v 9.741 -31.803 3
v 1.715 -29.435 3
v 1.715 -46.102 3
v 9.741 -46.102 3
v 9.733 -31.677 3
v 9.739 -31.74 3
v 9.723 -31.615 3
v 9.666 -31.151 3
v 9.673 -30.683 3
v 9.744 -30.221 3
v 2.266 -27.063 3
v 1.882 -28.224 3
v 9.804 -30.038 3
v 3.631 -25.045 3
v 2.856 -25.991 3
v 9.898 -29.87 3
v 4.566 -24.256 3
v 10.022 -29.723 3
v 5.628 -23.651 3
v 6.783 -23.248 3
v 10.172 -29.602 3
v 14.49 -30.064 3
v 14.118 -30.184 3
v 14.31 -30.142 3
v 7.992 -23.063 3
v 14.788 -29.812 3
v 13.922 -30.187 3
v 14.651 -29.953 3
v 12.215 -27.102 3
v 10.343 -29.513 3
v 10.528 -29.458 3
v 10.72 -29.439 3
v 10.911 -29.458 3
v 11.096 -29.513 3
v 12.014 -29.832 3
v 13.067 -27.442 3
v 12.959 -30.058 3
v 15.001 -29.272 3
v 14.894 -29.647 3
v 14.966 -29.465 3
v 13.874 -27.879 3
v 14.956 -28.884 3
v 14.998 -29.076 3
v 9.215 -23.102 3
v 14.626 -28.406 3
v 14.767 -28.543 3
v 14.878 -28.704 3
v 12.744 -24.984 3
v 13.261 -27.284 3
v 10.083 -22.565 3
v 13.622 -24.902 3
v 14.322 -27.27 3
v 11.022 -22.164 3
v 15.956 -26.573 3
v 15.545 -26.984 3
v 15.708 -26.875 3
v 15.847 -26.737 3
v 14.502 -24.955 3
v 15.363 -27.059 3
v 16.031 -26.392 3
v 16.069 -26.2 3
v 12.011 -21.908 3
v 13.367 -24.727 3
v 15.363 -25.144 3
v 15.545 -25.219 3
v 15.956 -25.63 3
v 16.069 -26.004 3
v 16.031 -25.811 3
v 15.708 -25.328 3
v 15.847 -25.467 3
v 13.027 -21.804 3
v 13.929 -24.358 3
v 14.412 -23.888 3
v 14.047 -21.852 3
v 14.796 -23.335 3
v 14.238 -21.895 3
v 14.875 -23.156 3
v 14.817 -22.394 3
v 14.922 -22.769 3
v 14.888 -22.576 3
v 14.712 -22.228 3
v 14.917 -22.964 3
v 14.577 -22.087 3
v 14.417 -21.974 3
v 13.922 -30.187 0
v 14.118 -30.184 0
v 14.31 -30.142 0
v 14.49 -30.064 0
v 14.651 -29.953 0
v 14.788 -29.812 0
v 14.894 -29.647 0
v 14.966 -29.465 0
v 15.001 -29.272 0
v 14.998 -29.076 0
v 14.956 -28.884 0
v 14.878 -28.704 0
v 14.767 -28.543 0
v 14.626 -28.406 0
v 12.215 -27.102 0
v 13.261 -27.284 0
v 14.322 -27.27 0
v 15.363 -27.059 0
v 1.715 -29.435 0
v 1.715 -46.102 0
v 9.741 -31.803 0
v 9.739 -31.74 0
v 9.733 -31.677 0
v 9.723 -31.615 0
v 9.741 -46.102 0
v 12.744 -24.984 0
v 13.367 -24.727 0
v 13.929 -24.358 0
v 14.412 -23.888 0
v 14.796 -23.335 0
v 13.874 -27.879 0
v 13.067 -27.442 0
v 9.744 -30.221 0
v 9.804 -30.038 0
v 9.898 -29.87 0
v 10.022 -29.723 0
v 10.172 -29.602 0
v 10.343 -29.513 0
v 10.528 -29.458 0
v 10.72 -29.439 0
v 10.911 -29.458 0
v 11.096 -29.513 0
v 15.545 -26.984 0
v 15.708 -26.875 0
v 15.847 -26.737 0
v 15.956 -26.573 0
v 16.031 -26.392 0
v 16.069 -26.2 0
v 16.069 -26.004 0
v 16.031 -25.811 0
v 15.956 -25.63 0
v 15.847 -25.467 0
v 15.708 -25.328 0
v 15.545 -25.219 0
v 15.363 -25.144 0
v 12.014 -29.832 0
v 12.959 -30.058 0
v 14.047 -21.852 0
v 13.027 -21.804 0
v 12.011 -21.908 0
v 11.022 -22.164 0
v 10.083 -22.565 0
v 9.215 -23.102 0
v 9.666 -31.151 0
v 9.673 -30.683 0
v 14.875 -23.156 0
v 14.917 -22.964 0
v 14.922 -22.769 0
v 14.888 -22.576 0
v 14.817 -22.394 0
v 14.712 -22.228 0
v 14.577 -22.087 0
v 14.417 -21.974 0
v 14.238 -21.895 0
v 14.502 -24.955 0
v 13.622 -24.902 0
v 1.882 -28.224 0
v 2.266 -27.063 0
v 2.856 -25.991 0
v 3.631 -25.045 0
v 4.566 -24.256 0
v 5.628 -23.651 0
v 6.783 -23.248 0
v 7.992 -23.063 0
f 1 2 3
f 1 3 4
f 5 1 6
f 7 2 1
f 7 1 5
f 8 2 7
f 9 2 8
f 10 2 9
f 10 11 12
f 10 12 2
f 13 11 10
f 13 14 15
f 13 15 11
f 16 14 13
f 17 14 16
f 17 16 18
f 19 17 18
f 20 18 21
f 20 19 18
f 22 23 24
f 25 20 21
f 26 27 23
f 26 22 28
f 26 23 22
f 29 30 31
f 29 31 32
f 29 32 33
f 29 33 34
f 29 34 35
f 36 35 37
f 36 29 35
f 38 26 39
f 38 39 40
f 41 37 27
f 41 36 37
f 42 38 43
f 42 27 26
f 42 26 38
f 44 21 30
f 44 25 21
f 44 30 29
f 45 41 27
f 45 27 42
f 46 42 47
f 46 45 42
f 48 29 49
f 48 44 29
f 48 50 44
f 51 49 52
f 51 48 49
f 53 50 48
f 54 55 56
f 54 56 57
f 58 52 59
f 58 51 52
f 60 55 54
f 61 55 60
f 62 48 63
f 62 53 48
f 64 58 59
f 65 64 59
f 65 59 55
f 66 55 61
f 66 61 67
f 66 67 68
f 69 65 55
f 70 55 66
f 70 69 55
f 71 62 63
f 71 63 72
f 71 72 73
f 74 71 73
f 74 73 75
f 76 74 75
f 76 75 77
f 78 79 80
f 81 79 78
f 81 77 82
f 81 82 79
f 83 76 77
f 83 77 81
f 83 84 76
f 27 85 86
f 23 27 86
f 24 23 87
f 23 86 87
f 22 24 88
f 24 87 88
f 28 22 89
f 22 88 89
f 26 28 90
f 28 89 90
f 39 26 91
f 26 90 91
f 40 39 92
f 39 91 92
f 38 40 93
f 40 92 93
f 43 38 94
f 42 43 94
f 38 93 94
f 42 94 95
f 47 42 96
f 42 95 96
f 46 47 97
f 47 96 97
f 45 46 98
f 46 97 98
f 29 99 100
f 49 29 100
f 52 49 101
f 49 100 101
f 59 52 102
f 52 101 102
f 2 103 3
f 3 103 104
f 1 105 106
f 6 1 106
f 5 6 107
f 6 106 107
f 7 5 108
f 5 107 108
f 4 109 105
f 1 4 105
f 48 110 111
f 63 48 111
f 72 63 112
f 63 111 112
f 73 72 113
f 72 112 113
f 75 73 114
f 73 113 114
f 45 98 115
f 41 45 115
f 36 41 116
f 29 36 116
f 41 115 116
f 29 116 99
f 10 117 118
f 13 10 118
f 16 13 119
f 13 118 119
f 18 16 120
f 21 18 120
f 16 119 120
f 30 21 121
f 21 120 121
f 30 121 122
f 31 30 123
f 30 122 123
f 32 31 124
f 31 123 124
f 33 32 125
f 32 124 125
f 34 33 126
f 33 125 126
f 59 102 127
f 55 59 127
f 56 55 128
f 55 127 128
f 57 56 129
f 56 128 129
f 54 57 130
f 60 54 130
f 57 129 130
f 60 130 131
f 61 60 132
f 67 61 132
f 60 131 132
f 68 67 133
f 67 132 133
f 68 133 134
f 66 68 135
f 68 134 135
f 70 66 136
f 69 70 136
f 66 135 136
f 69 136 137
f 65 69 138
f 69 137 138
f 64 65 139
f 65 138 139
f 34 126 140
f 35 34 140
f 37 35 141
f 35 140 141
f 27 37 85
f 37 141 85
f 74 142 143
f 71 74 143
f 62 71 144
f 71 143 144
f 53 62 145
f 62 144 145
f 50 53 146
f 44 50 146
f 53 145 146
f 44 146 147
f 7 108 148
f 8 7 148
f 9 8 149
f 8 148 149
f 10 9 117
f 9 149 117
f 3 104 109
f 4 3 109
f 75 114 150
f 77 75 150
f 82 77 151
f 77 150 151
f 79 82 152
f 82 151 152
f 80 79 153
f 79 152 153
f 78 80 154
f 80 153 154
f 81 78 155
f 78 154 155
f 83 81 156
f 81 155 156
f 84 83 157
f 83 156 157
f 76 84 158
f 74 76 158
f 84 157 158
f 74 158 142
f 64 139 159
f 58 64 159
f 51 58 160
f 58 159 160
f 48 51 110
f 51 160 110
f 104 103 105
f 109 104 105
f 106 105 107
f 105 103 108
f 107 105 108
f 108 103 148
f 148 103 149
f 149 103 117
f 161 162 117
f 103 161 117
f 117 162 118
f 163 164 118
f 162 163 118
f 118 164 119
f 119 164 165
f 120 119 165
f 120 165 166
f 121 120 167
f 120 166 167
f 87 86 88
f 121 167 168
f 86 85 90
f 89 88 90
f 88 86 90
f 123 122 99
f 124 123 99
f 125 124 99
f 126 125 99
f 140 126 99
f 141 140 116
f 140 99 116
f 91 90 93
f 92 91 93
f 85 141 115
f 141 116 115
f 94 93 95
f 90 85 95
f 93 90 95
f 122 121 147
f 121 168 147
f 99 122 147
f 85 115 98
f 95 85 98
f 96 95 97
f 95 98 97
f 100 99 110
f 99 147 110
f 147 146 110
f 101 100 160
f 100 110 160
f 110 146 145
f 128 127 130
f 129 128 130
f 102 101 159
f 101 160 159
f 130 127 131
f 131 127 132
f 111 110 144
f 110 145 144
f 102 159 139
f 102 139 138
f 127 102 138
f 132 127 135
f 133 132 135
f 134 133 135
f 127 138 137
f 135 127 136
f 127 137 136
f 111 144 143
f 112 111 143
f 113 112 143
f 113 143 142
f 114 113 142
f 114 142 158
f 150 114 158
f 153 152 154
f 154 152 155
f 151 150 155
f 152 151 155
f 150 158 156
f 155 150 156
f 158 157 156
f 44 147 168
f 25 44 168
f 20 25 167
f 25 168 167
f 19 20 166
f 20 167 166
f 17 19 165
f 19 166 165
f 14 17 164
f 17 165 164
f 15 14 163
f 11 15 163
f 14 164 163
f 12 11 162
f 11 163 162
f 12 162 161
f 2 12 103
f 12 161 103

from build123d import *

# Parameters (mm, degrees)
SALIENTE_EXTRUIR1_DEPTH = 3


with BuildPart() as part:
    # Model → Saliente-Extruir1 (new body)
    with BuildSketch(Plane.XY):
        with BuildLine():
            Line((9.740547774, -46.101668317), (9.740547774, -31.803295278))
            ThreePointArc((9.740547774, -31.803295278), (9.736055246, -31.708612265), (9.722618028, -31.614779984))
            ThreePointArc((9.722618028, -31.614779984), (9.661571414, -30.916777437), (9.743772485, -30.220948989))
            ThreePointArc((9.743772485, -30.220948989), (10.255649641, -29.553355931), (11.095913023, -29.512659959))
            ThreePointArc((11.095913023, -29.512659959), (12.483349153, -29.956983983), (13.921978985, -30.186651266))
            ThreePointArc((13.921978985, -30.186651266), (14.934379735, -29.557617963), (14.625590492, -28.406406697))
            ThreePointArc((14.625590492, -28.406406697), (13.477036488, -27.648728099), (12.214507774, -27.101668317))
            ThreePointArc((12.214507774, -27.101668317), (13.791868666, -27.302020525), (15.363211574, -27.058936478))
            ThreePointArc((15.363211574, -27.058936478), (16.074009796, -26.101668317), (15.363211574, -25.144400157))
            ThreePointArc((15.363211574, -25.144400157), (14.062919208, -24.911447806), (12.743919539, -24.984021259))
            ThreePointArc((12.743919539, -24.984021259), (13.929279153, -24.357532563), (14.796143037, -23.334736147))
            ThreePointArc((14.796143037, -23.334736147), (14.817045797, -22.393544381), (14.0469262, -21.852069843))
            ThreePointArc((14.0469262, -21.852069843), (11.511931096, -22.017503021), (9.214507774, -23.101668317))
            ThreePointArc((9.214507774, -23.101668317), (4.080372041, -24.629353346), (1.714507774, -29.435168317))
            Line((1.714507774, -29.435168317), (1.714507774, -46.101668317))
            Line((1.714507774, -46.101668317), (9.740547774, -46.101668317))
        make_face()
    extrude(amount=SALIENTE_EXTRUIR1_DEPTH)


solid = part.part
